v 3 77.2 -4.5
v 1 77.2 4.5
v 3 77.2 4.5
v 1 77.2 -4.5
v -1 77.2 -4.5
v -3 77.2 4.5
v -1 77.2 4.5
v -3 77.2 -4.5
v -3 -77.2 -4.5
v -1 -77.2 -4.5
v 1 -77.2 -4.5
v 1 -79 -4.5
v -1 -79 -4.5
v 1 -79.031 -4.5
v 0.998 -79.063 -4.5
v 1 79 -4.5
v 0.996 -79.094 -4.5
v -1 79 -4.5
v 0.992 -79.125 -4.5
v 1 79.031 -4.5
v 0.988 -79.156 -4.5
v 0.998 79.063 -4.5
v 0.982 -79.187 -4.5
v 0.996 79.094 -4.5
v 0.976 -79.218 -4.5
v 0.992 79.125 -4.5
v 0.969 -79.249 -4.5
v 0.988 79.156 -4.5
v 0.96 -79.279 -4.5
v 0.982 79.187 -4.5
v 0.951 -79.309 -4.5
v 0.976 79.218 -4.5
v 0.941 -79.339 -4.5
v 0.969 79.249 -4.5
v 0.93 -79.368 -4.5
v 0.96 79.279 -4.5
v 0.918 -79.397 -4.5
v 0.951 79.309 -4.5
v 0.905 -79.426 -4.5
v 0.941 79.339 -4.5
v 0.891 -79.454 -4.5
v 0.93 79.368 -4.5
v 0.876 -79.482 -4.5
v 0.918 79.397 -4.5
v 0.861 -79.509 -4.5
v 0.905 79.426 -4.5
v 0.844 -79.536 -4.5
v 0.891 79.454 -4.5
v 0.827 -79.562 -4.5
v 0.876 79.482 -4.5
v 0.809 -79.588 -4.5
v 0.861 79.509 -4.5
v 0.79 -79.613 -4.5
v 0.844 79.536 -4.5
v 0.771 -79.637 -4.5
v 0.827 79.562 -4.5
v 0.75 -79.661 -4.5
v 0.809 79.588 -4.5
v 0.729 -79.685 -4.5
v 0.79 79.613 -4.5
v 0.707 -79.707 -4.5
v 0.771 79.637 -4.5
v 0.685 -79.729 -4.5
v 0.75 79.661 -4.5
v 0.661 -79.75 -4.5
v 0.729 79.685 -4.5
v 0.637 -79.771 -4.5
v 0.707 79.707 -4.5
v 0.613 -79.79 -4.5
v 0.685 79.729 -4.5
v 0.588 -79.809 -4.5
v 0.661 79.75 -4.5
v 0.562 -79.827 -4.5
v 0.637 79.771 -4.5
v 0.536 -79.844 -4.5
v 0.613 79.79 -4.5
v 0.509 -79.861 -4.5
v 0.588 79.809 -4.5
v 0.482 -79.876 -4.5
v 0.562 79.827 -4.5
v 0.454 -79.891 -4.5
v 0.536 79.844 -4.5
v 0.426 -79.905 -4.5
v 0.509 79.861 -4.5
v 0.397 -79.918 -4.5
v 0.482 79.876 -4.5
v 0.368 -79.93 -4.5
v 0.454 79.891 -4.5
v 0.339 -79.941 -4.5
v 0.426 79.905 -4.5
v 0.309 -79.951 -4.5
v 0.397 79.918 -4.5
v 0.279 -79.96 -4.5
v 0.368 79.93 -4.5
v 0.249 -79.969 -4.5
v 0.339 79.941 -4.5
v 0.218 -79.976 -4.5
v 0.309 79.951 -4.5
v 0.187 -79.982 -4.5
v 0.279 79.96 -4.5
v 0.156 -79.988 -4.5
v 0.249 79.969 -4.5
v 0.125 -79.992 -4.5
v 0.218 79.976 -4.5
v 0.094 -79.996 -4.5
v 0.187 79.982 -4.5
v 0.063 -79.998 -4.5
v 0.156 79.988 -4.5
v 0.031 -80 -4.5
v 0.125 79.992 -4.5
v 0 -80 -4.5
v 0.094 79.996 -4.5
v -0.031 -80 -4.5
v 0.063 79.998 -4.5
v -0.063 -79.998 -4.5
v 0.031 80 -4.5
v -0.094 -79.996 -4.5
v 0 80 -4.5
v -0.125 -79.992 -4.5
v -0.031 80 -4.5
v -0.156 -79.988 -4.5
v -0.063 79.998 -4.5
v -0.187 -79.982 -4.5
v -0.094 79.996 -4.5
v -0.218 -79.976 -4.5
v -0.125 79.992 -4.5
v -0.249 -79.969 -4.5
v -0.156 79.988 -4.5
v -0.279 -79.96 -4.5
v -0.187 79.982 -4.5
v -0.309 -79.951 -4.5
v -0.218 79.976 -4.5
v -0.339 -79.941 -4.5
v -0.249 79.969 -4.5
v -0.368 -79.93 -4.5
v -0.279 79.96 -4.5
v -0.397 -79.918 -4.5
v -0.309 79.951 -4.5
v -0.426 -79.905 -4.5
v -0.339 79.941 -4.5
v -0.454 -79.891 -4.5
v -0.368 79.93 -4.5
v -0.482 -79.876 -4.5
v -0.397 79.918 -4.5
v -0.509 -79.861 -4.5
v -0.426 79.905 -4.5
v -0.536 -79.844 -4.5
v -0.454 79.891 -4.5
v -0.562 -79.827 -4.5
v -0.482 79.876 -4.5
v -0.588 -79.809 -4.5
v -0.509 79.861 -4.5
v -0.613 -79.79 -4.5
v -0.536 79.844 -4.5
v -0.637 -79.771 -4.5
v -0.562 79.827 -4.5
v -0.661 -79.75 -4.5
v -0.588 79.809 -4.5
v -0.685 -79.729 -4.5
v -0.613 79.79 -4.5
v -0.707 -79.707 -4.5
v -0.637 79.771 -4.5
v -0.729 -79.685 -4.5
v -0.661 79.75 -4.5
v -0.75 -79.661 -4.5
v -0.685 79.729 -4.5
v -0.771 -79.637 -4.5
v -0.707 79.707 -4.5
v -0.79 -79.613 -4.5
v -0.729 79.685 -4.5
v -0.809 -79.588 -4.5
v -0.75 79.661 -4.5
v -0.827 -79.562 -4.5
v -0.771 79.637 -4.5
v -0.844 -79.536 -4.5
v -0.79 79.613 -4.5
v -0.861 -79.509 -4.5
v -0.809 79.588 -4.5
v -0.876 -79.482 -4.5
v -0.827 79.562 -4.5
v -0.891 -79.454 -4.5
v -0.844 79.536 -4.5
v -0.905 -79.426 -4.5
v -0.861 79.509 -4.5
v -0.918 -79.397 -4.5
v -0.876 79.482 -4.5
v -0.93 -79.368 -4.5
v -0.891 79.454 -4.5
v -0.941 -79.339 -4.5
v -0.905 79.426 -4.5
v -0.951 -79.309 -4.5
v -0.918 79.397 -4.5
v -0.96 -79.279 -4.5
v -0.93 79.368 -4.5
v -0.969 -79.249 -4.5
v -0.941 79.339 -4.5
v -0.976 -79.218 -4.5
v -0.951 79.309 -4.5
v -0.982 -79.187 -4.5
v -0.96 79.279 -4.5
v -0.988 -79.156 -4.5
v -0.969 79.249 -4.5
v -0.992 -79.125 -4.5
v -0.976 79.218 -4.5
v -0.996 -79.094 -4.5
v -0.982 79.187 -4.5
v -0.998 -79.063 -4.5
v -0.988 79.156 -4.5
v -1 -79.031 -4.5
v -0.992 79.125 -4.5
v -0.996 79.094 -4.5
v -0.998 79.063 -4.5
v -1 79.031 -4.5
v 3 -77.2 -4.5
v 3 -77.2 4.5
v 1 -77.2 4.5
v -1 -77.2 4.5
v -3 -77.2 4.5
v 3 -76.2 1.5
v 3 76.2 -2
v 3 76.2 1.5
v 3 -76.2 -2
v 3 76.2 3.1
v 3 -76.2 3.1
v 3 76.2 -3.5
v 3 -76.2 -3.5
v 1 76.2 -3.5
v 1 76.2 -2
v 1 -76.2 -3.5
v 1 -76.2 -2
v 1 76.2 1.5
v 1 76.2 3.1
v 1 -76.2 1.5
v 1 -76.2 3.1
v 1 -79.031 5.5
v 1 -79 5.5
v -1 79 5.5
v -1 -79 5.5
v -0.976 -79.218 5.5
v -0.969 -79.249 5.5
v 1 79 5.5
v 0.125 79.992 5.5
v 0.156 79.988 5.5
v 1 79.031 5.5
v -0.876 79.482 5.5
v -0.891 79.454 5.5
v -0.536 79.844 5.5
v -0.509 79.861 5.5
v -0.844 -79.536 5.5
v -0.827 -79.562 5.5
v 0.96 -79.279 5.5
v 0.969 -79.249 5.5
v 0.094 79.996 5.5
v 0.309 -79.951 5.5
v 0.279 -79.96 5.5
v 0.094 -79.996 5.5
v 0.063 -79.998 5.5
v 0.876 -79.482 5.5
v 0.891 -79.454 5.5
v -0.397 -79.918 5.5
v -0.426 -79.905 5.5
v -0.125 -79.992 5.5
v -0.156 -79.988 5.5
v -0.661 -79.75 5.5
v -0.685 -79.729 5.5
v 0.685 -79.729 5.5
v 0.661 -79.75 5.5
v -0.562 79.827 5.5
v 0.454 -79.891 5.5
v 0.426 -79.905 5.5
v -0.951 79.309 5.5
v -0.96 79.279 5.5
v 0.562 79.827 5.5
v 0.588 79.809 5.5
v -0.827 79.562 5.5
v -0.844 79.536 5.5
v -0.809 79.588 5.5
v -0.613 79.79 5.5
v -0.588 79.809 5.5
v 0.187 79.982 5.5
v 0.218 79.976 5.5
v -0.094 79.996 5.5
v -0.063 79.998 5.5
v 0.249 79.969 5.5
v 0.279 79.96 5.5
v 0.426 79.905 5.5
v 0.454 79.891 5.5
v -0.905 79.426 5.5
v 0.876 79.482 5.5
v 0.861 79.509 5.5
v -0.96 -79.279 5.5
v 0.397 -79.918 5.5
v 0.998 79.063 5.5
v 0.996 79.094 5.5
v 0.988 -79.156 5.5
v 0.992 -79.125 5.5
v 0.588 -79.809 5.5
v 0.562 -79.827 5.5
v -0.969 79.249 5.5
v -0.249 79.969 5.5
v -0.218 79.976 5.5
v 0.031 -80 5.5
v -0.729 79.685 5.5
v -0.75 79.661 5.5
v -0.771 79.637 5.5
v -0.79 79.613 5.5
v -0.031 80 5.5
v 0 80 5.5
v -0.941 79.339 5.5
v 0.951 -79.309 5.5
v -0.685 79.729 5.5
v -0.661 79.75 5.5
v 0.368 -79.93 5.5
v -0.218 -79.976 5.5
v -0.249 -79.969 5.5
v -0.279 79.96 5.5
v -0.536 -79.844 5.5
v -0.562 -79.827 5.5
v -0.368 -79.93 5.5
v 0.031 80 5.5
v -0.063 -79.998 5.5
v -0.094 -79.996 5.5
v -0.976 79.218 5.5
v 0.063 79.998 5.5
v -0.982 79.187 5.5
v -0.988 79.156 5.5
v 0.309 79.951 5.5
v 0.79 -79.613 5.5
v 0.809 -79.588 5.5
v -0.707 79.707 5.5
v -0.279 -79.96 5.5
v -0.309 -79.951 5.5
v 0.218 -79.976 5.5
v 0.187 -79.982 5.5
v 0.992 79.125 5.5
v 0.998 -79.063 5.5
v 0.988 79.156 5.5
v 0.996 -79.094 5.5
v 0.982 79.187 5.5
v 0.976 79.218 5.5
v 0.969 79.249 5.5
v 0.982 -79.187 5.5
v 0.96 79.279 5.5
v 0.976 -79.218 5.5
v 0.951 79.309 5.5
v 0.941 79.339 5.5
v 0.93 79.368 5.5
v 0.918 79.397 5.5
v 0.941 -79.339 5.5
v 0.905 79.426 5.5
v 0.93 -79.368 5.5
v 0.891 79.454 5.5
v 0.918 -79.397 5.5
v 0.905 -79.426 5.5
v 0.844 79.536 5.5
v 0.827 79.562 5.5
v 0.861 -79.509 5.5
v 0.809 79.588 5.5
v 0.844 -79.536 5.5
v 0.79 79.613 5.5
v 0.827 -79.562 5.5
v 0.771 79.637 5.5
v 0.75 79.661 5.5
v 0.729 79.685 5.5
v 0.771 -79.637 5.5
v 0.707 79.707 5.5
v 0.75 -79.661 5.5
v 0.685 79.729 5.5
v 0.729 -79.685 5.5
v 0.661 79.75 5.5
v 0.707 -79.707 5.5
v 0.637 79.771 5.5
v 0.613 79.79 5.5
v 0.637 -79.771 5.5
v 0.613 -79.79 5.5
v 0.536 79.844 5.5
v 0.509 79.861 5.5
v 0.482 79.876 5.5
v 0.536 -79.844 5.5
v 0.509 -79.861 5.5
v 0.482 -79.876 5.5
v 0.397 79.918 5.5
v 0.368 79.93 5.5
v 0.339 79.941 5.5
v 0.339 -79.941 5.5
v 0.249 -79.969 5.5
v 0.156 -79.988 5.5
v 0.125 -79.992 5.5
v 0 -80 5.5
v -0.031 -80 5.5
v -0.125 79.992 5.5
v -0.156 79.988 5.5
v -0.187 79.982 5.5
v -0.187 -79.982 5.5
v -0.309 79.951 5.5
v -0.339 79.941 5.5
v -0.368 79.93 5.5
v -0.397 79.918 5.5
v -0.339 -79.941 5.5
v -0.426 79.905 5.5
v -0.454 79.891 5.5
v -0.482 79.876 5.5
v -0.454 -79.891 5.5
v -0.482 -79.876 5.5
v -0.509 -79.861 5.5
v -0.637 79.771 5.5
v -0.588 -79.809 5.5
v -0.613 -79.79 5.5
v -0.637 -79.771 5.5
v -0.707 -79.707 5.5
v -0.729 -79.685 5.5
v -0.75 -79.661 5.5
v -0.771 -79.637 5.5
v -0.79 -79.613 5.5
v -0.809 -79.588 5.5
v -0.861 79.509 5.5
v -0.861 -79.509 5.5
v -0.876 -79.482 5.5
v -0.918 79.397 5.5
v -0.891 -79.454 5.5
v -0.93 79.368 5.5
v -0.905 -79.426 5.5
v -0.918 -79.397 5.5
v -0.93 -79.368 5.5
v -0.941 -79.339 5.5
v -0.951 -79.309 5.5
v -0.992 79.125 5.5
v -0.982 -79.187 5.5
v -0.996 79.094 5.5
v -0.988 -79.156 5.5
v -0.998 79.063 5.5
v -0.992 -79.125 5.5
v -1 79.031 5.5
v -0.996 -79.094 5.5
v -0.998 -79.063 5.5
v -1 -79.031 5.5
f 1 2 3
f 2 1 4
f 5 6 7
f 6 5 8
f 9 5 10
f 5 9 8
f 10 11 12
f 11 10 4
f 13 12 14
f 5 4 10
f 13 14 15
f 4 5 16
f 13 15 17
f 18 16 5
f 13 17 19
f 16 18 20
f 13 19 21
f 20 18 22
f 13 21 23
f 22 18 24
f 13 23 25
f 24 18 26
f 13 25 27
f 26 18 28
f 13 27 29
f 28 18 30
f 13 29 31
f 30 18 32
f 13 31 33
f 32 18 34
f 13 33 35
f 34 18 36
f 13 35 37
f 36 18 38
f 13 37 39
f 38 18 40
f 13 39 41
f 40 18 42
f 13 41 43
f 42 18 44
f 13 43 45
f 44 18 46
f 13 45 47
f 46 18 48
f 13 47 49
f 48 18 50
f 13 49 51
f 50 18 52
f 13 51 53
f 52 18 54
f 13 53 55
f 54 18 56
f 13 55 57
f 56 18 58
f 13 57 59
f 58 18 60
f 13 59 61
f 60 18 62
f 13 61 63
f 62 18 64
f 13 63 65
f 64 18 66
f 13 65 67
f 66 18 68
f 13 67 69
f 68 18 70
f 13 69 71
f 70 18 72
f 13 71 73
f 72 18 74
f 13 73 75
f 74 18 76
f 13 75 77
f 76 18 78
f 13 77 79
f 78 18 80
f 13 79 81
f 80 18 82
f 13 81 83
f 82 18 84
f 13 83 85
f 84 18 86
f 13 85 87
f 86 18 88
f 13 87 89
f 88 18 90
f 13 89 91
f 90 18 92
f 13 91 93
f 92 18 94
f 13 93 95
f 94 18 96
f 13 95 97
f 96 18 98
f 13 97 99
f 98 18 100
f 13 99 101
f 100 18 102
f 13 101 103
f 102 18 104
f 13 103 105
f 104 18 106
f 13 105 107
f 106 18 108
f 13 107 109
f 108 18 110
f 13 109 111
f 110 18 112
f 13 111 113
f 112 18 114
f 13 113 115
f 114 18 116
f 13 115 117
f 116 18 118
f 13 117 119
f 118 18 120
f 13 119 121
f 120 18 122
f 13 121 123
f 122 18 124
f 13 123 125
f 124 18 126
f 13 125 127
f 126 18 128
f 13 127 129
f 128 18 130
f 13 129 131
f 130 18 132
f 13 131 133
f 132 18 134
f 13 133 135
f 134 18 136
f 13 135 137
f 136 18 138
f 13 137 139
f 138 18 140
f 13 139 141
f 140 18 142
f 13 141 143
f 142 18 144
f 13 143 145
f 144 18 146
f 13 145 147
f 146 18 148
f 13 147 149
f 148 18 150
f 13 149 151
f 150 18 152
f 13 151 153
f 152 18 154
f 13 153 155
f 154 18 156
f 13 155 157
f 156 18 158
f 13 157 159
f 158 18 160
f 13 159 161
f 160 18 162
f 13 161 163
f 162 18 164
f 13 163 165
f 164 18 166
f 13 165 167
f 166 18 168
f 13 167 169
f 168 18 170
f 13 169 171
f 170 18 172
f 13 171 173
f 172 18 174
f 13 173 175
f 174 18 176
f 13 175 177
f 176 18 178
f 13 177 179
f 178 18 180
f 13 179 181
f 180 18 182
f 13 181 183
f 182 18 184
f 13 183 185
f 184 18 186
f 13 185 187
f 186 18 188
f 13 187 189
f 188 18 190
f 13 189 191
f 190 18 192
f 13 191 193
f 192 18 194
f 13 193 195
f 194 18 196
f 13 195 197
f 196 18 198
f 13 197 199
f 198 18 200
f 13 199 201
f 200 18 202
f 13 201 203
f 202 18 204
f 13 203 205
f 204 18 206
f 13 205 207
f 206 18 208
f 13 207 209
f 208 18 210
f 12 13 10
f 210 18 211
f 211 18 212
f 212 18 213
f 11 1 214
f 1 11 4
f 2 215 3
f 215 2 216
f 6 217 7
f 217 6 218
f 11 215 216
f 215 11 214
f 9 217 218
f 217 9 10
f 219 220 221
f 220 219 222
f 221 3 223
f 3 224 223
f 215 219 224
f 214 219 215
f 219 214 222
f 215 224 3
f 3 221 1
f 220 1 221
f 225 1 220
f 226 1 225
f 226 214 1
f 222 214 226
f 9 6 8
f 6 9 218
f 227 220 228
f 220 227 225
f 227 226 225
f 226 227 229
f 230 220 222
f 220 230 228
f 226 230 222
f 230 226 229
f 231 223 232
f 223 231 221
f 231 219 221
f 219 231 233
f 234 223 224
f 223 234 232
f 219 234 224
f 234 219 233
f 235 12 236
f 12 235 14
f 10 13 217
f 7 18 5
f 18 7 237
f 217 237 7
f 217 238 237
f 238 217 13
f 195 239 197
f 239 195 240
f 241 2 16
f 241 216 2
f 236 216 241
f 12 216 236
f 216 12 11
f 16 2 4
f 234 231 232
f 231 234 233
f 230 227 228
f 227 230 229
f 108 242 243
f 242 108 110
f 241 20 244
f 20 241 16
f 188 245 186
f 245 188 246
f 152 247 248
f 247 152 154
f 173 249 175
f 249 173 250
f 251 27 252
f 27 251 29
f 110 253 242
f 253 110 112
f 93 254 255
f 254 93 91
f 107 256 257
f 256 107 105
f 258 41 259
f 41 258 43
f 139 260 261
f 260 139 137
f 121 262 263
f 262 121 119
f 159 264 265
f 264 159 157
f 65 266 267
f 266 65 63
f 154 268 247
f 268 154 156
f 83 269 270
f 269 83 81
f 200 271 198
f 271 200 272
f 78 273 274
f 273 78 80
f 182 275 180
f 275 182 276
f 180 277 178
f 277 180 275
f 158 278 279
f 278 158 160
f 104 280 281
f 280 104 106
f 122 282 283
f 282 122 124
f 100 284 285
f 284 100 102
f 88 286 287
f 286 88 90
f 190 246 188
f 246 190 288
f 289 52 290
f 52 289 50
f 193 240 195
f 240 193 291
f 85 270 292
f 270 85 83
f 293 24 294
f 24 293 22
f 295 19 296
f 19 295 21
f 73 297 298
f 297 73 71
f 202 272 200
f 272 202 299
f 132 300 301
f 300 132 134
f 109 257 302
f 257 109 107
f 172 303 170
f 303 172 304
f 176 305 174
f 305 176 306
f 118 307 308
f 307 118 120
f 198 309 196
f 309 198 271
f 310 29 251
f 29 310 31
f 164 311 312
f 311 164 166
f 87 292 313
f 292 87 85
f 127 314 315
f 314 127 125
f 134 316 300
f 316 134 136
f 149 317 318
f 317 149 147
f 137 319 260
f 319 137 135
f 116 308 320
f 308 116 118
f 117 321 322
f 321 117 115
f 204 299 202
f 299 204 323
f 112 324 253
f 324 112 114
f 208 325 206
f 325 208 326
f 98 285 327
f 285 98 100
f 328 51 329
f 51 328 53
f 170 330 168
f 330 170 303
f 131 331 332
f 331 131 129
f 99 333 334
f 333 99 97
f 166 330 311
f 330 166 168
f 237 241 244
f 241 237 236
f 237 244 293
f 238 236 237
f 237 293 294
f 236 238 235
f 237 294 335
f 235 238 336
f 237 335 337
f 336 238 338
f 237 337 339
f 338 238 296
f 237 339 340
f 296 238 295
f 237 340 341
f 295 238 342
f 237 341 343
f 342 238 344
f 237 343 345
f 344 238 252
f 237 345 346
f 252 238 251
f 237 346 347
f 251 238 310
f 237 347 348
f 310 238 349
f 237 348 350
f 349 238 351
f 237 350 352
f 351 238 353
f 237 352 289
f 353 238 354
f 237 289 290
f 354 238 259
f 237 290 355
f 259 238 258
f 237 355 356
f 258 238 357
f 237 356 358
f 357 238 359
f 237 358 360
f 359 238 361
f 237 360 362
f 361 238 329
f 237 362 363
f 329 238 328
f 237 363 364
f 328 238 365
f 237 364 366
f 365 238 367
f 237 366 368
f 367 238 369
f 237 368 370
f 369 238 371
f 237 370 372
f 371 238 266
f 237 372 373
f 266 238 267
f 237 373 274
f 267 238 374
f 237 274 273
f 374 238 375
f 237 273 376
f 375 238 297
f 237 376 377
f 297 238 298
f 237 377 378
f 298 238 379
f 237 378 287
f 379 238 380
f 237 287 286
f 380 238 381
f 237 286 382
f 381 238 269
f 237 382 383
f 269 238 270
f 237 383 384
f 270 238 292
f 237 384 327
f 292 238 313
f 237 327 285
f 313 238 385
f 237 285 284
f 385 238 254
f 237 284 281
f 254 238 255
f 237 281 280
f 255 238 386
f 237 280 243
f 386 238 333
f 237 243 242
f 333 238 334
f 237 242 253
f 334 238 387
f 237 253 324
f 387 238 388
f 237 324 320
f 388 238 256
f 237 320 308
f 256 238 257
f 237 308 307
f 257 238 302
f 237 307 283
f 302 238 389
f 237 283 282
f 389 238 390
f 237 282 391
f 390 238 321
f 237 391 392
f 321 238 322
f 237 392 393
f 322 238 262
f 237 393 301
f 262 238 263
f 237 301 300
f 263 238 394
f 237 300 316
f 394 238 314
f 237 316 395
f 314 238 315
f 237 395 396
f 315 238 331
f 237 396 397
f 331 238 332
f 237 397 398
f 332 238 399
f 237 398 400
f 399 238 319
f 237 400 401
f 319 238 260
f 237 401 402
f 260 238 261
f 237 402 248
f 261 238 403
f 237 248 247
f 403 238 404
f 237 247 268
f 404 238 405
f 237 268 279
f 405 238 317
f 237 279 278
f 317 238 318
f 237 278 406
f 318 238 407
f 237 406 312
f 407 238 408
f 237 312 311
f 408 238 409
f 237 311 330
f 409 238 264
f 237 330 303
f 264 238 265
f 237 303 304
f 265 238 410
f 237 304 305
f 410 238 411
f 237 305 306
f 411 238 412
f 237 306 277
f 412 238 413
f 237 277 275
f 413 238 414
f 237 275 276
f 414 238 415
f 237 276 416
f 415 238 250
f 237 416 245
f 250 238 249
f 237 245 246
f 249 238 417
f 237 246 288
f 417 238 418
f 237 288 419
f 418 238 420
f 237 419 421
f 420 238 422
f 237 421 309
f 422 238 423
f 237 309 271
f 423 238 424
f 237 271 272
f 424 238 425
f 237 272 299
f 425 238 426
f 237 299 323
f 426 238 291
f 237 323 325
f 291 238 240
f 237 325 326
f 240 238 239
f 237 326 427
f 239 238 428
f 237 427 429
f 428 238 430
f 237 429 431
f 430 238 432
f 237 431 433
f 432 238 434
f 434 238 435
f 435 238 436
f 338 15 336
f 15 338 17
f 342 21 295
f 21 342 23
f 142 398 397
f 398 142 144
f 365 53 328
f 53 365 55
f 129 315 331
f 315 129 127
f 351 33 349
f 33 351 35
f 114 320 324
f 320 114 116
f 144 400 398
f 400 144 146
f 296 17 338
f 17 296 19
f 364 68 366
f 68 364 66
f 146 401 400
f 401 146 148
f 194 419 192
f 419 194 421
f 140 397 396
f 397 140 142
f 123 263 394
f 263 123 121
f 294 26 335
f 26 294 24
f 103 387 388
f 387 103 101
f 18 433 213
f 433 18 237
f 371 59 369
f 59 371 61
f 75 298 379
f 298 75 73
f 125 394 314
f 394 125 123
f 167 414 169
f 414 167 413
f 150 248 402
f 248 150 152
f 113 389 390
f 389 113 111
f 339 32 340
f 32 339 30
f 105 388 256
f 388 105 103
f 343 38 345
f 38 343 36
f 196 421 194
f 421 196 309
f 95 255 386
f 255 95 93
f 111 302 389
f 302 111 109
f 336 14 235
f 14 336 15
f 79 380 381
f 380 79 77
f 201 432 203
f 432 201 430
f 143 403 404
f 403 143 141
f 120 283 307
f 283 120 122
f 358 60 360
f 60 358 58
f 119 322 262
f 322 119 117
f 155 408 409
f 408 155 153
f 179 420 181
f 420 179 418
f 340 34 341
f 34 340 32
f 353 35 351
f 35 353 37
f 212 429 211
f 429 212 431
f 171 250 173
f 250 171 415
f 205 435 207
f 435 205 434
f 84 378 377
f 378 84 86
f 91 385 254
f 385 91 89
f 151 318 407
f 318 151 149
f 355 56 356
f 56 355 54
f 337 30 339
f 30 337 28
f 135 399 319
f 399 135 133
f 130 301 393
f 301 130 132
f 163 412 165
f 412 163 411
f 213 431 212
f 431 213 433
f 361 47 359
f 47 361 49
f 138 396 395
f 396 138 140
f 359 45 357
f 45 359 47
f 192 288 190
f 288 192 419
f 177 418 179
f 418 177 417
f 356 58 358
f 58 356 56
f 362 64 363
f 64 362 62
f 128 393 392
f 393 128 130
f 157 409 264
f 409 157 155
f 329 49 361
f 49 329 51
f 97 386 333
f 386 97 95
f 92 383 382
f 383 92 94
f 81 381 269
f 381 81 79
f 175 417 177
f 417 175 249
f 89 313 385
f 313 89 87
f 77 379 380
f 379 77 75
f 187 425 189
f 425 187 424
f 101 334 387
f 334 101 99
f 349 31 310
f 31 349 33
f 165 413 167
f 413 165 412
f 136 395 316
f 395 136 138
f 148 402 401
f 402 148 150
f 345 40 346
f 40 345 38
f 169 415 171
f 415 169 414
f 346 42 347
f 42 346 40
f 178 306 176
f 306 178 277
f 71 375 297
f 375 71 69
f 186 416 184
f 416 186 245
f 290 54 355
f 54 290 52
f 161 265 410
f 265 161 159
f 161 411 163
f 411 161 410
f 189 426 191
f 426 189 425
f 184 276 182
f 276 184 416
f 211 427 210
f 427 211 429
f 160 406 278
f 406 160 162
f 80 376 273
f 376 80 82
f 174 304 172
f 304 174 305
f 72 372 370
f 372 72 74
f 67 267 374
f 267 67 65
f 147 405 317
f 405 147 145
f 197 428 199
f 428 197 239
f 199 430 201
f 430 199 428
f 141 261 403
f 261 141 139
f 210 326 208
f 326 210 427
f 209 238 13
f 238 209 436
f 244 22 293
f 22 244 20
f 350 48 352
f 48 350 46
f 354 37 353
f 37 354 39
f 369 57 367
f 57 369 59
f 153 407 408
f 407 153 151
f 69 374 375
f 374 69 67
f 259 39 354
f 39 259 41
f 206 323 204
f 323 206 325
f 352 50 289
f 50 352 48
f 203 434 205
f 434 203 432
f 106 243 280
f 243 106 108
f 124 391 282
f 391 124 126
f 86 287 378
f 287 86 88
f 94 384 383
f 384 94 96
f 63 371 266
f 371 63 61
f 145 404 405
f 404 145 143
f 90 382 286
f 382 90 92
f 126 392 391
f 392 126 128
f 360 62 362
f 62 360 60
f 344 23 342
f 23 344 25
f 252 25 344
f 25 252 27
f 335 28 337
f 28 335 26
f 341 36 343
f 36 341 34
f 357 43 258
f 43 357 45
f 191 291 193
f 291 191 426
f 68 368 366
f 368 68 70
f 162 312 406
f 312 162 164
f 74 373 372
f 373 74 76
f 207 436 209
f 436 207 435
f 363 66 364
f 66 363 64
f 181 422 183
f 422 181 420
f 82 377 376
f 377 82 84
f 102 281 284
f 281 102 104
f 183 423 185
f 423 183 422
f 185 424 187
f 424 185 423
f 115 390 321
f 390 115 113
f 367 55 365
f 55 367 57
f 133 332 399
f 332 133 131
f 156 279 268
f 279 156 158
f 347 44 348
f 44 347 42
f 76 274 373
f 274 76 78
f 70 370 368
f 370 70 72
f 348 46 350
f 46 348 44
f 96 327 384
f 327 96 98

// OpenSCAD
// file: side_bar.scad
module side_bar() {    
    union() {
        // slots
        translate([0, 0, 3.5]) difference() {
            translate([0, 0, -3.5]) cube([154.4, 6, 9], center = true);
    
            // plate slot
            translate([0, 2.5, -0.75]) cube([152.4, 5, 1.5], center = true);
    
            // pcb slot
            translate([0, 2.5, 0.8 - 1.6 - 5]) cube([152.4, 5, 1.6], center = true);
        }
    
        // side bar
//        translate([0, 0, -0.5]) cube([160.4, 2, 10], center = true);
        translate([0, 0, -0.5]) hull() {
            $fn = 200;
            translate([79, 0, 0]) cylinder(h = 10, r = 1, center = true);
            translate([-79, 0, 0]) cylinder(h = 10, r = 1, center = true);
        }
    }
}
// file: bottom.scad
module bottom_piece() {
    difference() {
        union() {
            difference() {
                hull() {
                    $fn = 200;
                    border_rad = 2;
                    width = 303.3;
                    height = 168.4;
                    depth = 15;
                    
                    pos_cylinder_x = width / 2 - border_rad;
                    pos_cylinder_y = height / 2 - border_rad; 
                    
                    position = [
                        [pos_cylinder_x, pos_cylinder_y, 0],
                        [-pos_cylinder_x, pos_cylinder_y, 0],
                        [pos_cylinder_x, -pos_cylinder_y, 0],
                        [-pos_cylinder_x, -pos_cylinder_y, 0],
                    ];
                    
                    for (pos = position) {
                        translate(pos)  cylinder(h = depth, r = border_rad, center = true);
                    }
                }
                
                // main cut
                translate([0, 0, 3.5]) cube([400, 154.4, 10], center = true);
                
                // Side cut
                translate([148.65, 0, 3]) cube([2, 160.4, 11], center = true);
                translate([-148.65, 0, 3]) cube([2, 160.4, 11], center = true);
            }
            
            translate([0, 80.225, 2.5]) cube([291.3, 7.95, 10], center = true);
        }
        
        // Screw holes
        // In bottom plate thread: 8mm
        // In top plate: 4mm
        
        screw_positions = [
            [90, 80.7, -1.5],
            [-90, 80.7, -1.5],
            [90, -80.7, -1.5],
            [-90, -80.7, -1.5],
        ];
        
        for (screw_pos = screw_positions) {
            translate(screw_pos) union() {
                $fn = 200;
                cylinder(h = 10, d = 2.51);
                translate([0, 0, -9]) cylinder(h = 10, d = 4.43);
            }
        }
        
        // Top piece mounting point
        translate([0, 80.7, 8]) cube([40, 2, 5], center = true);
        translate([0, -80.7, 8]) cube([40, 2, 5], center = true);
        
        // USB C socket
        translate([-123.1, 77.5, 2.9]) rotate([90, 90, 0]) union() {
            hull() {
                $fn=200;
                translate([0, 3.25, -10]) cylinder(30, d1=2.7, d2=2.7);
                translate([0, -3.25, -10]) cylinder(30, d1=2.7, d2=2.7);
            }
    
            hull() {
                $fn=200;
                translate([0, 3.25, -10]) cylinder(10, d1=7, d2=7);
                translate([0, -3.25, -10]) cylinder(10, d1=7, d2=7);
            }
        }
    }
}
// file: top.scad
module top_piece() {    
    difference() {
        // Main plate
        union() {
            hull() {
                $fn = 200;
                border_rad = 2;
                width = 303.3;
                height = 168.4;
                depth = 10;
                
                pos_cylinder_x = width / 2 - border_rad;
                pos_cylinder_y = height / 2 - border_rad; 
                
                position = [
                    [pos_cylinder_x, pos_cylinder_y, 0],
                    [-pos_cylinder_x, pos_cylinder_y, 0],
                    [pos_cylinder_x, -pos_cylinder_y, 0],
                    [-pos_cylinder_x, -pos_cylinder_y, 0],
                ];
                
                for (pos = position) {
                    translate(pos)  cylinder(h = depth, r = border_rad, center = true);
                }
            }
            
            // Mounting pivots
            mounting_positions = [
                [0, 80.7, -5.5],
                [0, -80.7, -5.5],
            ];
            
            for (mnt_pos = mounting_positions) {
                translate(mnt_pos) hull() {
                    $fn = 200;
                    translate([-18.95, 0, 0]) cylinder(h = 2, r = 1, center = true);
                    translate([18.95, 0, 0]) cylinder(h = 2, r = 1, center = true);
                }
            }
        }
    
        // Main cut
        translate([0, -(19.05 - 3.76), 0]) hull() {
            $fn = 200;
            border_rad = 1;
            width = 288.9;
            height = 116.3;
            depth = 20;
            
            pos_cylinder_x = width / 2 - border_rad;
            pos_cylinder_y = height / 2 - border_rad; 
            
            position = [
                [pos_cylinder_x, pos_cylinder_y, 0],
                [-pos_cylinder_x, pos_cylinder_y, 0],
                [pos_cylinder_x, -pos_cylinder_y, 0],
                [-pos_cylinder_x, -pos_cylinder_y, 0],
            ];
            
            for (pos = position) {
                translate(pos)  cylinder(h = depth, r = border_rad, center = true);
            }
        }
        
        // Controller cut
        translate([0, 61.55, -2.5]) hull() {
            $fn = 200;
            border_rad = 1;
            width = 288.9;
            height = 30.32;
            depth = 7;
            
            pos_cylinder_x = width / 2 - border_rad;
            pos_cylinder_y = height / 2 - border_rad; 
            
            position = [
                [pos_cylinder_x, pos_cylinder_y, 0],
                [-pos_cylinder_x, pos_cylinder_y, 0],
                [pos_cylinder_x, -pos_cylinder_y, 0],
                [-pos_cylinder_x, -pos_cylinder_y, 0],
            ];
            
            for (pos = position) {
                translate(pos)  cylinder(h = depth, r = border_rad, center = true);
            }
        }
        
        // Screw socket
        screw_positions = [
            [90, 80.7, -5.1],
            [-90, 80.7, -5.1],
            [90, -80.7, -5.1],
            [-90, -80.7, -5.1],
        ];
        
        for (screw_pos = screw_positions) {
            translate(screw_pos) union() {
                $fn = 200;
                cylinder(h = 5.3, d = 3.7);
            }
        }
    }
}
// main file
use <top.scad>
use <bottom.scad>
use <side_bar.scad>

// [0, 0, 0]
//translate([0, 0, 0]) bottom_piece();

// [0, 0, 12.5]
//rotate([0, 180, 0]) translate([0, 0, 0]) top_piece();

// [-148.65, 0, 3]
translate([0, 0, 0]) rotate([180, 0, 90]) side_bar();

// [148.65, 0, 3]
//translate([180, 0, 25]) rotate([0, 0, 90]) side_bar();
